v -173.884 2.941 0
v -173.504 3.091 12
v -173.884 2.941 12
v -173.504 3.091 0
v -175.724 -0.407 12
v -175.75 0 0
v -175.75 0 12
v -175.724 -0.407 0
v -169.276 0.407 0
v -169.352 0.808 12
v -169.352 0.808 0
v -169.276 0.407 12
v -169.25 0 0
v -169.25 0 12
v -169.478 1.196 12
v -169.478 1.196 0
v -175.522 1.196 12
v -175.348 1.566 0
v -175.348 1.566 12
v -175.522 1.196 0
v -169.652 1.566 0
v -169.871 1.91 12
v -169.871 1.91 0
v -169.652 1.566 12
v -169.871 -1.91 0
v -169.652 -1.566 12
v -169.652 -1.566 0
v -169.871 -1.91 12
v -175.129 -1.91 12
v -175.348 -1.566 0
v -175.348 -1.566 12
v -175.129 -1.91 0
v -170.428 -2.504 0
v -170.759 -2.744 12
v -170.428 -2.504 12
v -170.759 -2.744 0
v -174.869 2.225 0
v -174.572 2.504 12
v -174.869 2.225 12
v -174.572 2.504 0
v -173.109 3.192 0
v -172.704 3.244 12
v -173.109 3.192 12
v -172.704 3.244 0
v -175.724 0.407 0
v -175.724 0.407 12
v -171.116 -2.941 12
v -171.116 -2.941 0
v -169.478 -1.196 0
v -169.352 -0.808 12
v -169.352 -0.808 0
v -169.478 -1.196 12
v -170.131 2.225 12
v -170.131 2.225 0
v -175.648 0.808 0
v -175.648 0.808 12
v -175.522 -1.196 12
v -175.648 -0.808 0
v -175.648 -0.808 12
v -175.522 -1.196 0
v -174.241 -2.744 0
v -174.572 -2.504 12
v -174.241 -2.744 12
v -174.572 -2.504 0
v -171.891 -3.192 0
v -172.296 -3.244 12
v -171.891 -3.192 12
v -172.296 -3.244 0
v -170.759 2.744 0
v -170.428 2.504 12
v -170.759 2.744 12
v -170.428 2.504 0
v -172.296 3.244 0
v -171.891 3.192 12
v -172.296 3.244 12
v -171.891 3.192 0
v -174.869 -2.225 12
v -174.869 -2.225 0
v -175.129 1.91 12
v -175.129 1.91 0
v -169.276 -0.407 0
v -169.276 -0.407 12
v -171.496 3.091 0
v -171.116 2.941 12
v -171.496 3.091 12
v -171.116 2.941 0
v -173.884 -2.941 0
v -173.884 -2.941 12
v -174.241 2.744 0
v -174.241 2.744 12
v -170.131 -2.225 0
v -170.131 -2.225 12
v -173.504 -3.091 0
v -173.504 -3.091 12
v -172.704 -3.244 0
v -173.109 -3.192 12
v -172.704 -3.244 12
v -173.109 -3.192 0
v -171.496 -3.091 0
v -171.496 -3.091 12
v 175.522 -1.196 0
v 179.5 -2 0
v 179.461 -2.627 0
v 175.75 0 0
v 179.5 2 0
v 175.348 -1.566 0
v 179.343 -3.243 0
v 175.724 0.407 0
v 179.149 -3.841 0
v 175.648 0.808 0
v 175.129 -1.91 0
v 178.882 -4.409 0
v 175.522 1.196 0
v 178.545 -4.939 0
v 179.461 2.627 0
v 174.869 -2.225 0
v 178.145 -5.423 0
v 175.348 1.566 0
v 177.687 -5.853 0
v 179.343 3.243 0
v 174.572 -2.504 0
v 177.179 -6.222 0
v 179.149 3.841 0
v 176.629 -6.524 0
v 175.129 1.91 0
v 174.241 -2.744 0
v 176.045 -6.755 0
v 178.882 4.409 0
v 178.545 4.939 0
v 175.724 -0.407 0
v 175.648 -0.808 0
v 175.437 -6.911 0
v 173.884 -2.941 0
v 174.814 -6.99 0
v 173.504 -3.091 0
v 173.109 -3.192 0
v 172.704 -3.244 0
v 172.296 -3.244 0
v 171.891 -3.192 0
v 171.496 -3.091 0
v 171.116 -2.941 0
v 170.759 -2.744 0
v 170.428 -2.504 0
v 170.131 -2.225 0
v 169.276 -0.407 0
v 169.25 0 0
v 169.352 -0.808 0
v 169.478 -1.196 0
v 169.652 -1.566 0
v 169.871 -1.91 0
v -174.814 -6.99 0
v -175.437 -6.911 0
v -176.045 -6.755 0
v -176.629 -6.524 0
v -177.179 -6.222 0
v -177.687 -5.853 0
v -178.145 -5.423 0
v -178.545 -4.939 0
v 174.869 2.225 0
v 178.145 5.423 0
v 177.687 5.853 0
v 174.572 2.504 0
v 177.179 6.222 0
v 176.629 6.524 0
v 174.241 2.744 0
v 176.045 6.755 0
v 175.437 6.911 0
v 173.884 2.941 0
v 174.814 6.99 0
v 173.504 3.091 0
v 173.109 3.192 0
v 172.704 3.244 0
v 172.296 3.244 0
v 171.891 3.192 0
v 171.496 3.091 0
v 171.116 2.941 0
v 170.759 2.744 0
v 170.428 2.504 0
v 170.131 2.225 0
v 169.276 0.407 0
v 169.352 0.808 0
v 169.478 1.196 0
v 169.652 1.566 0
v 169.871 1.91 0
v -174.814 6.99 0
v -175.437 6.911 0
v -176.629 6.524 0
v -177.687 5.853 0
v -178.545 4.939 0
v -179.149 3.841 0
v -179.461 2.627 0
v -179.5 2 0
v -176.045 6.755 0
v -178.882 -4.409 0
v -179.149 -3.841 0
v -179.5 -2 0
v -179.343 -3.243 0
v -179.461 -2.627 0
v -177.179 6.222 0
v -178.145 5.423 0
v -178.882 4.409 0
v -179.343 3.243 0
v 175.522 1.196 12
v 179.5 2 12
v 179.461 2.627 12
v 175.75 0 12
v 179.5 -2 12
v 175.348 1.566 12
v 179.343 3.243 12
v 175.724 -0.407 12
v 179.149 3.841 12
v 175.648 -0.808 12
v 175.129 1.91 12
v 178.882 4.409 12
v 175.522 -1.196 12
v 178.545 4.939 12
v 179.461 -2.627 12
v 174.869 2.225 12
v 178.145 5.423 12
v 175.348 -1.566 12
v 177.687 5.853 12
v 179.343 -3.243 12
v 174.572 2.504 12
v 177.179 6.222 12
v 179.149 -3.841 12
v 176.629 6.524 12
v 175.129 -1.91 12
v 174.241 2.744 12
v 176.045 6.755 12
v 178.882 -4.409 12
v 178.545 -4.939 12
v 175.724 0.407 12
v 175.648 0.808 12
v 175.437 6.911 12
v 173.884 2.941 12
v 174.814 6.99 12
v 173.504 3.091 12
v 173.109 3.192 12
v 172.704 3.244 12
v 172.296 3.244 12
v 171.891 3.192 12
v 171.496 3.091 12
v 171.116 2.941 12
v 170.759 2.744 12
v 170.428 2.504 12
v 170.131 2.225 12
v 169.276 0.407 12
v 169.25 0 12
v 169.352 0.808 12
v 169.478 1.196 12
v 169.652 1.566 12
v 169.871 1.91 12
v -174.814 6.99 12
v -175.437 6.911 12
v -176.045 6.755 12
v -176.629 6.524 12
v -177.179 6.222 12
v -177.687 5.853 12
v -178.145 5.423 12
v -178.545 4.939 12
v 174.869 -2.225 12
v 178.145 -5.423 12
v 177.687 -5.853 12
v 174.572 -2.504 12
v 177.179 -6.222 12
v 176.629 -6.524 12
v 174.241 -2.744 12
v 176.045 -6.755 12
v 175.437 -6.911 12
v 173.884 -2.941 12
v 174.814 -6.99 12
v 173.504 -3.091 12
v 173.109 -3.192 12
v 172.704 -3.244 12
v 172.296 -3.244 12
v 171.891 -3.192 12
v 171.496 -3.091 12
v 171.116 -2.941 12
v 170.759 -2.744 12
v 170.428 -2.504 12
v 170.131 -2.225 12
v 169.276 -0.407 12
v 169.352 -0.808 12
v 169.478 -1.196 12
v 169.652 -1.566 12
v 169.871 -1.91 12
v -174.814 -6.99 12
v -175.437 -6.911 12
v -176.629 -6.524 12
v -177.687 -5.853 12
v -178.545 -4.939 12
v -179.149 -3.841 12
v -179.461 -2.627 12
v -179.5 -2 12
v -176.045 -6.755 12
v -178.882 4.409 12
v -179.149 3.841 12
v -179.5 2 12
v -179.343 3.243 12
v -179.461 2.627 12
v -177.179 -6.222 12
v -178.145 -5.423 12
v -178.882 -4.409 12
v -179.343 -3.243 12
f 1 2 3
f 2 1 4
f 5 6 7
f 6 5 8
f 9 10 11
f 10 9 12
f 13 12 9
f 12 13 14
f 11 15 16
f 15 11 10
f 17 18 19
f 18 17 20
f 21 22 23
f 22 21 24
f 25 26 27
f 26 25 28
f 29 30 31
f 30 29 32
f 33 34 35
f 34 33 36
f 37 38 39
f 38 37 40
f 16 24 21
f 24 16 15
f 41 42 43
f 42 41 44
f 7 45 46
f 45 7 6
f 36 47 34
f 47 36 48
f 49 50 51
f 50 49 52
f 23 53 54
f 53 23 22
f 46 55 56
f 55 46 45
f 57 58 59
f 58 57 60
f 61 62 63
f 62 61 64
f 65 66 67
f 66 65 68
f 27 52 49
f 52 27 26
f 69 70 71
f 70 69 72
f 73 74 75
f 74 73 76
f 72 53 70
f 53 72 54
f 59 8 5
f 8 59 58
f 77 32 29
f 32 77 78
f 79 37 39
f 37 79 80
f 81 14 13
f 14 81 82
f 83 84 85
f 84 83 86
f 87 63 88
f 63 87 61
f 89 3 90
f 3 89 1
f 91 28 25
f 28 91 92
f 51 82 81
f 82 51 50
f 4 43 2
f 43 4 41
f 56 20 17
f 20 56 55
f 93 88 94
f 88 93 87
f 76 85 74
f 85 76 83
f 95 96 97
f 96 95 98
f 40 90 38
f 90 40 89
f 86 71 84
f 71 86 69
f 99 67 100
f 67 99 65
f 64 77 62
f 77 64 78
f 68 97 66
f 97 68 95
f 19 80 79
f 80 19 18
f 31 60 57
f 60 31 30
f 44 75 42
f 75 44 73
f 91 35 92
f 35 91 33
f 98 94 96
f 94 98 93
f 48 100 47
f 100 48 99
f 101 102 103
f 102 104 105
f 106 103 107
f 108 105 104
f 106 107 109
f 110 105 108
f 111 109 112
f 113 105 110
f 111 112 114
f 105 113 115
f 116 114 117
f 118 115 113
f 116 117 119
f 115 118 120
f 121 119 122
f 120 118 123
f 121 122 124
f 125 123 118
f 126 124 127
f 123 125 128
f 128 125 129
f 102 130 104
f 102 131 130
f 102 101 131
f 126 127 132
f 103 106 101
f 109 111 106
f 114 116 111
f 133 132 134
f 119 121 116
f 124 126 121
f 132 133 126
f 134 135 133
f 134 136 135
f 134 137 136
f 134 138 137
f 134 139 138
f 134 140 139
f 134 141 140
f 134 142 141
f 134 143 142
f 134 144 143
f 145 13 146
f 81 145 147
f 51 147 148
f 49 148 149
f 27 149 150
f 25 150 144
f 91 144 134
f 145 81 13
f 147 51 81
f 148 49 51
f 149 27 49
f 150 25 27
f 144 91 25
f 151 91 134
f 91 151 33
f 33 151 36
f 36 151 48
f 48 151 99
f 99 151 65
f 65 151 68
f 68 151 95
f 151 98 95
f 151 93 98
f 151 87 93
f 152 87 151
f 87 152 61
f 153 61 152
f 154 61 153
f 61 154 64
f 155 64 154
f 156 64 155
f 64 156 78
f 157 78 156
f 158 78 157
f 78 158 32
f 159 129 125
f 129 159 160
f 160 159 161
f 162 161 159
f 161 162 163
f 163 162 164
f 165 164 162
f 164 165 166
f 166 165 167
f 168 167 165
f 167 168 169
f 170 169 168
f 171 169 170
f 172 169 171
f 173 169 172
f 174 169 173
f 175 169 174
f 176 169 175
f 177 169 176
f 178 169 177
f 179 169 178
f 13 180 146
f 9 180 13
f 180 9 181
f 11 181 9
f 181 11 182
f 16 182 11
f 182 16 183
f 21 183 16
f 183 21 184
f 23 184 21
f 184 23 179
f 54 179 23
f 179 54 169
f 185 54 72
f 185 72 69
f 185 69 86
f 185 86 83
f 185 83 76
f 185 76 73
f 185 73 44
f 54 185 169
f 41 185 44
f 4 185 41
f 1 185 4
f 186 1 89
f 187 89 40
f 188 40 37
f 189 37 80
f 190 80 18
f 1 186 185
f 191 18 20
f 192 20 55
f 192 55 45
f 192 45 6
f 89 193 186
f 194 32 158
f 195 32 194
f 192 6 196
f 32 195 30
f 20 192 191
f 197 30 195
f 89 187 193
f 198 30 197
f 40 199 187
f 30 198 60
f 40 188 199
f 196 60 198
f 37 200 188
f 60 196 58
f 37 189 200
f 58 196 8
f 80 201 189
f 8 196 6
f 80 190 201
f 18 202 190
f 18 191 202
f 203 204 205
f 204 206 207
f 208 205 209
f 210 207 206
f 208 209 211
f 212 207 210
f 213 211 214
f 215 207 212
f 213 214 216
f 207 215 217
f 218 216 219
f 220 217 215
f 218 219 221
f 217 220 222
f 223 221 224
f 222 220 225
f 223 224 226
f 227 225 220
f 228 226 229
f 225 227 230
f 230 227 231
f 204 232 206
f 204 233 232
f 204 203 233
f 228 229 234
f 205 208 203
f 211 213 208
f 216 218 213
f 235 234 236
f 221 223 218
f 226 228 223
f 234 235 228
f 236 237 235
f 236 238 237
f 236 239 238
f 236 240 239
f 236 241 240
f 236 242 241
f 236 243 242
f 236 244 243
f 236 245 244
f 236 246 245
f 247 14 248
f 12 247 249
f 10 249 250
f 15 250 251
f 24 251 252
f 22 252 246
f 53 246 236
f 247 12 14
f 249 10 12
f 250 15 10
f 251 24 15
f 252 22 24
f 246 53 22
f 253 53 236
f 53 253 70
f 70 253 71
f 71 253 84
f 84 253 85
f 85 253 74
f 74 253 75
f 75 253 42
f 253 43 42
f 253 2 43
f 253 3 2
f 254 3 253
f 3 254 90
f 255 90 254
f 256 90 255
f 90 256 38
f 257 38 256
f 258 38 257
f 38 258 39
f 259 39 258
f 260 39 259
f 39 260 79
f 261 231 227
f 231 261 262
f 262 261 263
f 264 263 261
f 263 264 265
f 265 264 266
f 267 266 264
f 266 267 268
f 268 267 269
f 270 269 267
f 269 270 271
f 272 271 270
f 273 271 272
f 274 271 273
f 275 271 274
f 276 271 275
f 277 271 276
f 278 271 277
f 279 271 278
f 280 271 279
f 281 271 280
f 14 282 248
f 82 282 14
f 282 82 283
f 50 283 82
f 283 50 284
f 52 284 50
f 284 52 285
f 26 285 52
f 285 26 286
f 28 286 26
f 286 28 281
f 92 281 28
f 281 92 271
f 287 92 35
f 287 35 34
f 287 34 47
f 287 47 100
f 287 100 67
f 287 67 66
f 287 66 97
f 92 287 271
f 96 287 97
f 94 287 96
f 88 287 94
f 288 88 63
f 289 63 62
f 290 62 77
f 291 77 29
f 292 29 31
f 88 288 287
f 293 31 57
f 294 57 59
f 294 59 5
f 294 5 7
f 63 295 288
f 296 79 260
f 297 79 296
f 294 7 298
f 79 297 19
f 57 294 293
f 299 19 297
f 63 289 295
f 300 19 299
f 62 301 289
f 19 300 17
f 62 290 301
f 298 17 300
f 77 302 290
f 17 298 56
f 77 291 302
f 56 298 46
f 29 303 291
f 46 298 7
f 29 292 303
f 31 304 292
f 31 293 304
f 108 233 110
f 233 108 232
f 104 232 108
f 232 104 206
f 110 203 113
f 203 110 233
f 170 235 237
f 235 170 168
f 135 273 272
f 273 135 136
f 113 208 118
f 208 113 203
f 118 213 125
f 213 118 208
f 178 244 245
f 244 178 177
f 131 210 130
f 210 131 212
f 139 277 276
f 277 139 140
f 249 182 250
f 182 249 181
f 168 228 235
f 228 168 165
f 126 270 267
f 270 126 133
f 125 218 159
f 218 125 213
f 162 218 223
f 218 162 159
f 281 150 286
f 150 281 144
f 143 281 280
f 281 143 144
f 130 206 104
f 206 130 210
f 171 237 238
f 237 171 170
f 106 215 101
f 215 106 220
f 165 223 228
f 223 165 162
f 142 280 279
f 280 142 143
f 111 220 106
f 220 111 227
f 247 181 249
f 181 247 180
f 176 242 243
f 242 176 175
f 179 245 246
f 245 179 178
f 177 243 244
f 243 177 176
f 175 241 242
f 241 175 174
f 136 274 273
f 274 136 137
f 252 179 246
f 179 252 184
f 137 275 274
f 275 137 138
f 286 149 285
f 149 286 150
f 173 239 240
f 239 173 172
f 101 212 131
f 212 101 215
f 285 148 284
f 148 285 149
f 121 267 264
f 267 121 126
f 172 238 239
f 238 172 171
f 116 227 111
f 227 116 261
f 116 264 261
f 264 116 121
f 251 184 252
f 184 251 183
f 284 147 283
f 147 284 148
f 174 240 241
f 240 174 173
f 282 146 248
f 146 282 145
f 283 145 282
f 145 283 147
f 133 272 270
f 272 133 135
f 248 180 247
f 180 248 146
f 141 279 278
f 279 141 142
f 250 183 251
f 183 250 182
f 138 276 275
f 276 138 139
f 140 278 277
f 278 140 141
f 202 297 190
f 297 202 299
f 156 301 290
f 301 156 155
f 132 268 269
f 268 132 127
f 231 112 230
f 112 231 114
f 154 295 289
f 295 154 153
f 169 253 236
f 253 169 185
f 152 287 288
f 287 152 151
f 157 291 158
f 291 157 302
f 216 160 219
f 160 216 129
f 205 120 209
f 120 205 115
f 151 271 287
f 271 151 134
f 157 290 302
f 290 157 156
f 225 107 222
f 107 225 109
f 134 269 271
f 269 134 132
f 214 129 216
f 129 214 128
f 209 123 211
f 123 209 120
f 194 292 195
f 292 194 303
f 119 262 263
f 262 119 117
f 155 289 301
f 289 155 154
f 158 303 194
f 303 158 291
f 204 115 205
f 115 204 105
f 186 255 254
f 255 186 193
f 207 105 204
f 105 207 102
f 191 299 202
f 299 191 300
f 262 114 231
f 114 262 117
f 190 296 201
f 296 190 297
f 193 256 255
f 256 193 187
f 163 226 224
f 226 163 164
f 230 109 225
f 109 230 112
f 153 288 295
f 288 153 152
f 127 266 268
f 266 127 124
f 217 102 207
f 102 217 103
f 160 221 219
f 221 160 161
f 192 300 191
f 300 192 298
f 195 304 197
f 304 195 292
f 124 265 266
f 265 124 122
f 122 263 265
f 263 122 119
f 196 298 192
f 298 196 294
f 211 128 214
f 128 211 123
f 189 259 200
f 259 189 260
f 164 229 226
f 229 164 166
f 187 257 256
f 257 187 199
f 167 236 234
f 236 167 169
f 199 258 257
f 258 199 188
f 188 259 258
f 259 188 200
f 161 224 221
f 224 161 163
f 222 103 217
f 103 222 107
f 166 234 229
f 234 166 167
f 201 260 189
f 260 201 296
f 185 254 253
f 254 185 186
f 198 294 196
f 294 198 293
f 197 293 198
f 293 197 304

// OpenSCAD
$fn = 50;


difference() {
	union() {
		hull() {
			translate(v = [-174.5000000000, 2.0000000000, 0]) {
				cylinder(h = 12, r = 5);
			}
			translate(v = [174.5000000000, 2.0000000000, 0]) {
				cylinder(h = 12, r = 5);
			}
			translate(v = [-174.5000000000, -2.0000000000, 0]) {
				cylinder(h = 12, r = 5);
			}
			translate(v = [174.5000000000, -2.0000000000, 0]) {
				cylinder(h = 12, r = 5);
			}
		}
	}
	union() {
		translate(v = [-172.5000000000, 0.0000000000, 0]) {
			cylinder(h = 12, r = 3.2500000000);
		}
		translate(v = [172.5000000000, 0.0000000000, 0]) {
			cylinder(h = 12, r = 3.2500000000);
		}
		translate(v = [-172.5000000000, 0.0000000000, 0]) {
			cylinder(h = 12, r = 1.8000000000);
		}
		translate(v = [172.5000000000, 0.0000000000, 0]) {
			cylinder(h = 12, r = 1.8000000000);
		}
		translate(v = [-172.5000000000, 0.0000000000, 0]) {
			cylinder(h = 12, r = 1.8000000000);
		}
		translate(v = [172.5000000000, 0.0000000000, 0]) {
			cylinder(h = 12, r = 1.8000000000);
		}
		translate(v = [-172.5000000000, 0.0000000000, 0]) {
			cylinder(h = 12, r = 1.8000000000);
		}
		translate(v = [172.5000000000, 0.0000000000, 0]) {
			cylinder(h = 12, r = 1.8000000000);
		}
	}
}
